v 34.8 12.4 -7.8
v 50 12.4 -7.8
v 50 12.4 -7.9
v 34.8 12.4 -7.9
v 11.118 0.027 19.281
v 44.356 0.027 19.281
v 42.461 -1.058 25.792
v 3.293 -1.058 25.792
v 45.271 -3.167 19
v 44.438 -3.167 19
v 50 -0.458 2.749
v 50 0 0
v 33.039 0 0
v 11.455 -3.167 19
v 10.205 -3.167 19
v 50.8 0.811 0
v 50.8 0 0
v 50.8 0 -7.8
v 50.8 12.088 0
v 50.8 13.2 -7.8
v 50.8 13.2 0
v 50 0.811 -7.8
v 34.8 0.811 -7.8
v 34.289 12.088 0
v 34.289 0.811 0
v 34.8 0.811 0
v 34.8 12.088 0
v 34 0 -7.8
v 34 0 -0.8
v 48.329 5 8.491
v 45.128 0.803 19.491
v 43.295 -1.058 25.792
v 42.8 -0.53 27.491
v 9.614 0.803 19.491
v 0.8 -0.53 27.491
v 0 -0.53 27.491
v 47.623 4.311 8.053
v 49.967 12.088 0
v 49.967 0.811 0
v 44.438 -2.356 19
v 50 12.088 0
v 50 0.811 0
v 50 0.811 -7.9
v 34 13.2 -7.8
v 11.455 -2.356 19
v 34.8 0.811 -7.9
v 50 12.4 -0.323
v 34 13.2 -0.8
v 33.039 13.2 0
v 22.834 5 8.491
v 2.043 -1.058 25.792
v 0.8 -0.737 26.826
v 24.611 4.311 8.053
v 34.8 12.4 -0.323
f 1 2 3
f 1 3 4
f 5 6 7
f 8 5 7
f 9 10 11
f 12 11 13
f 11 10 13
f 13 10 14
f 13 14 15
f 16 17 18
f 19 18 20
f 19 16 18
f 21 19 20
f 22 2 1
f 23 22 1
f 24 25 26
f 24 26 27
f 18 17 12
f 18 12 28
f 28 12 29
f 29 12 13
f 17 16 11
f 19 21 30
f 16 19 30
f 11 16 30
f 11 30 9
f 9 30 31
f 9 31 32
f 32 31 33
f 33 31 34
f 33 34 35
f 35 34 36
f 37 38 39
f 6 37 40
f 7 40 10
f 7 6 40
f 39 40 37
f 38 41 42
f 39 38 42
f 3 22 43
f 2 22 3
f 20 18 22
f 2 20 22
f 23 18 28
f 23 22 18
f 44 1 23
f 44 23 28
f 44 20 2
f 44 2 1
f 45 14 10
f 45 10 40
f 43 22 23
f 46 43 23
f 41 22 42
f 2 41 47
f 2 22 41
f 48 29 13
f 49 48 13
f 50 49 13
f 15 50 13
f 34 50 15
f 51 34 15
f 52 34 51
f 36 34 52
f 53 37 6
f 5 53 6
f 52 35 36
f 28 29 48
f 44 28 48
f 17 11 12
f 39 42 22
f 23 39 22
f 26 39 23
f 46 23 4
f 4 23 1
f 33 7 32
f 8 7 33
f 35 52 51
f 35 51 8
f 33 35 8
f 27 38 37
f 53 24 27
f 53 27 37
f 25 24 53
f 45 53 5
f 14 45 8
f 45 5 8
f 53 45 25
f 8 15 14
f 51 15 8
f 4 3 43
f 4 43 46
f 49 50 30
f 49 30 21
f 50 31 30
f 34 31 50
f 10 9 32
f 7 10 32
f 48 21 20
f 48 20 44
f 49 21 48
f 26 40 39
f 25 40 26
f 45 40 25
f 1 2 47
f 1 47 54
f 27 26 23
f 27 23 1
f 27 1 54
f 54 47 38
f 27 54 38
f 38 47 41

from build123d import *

# Parameters (mm, degrees)
SIDE_BASE_DEPTH                    = 0.8
SIDE_BASE_2_COUNT                  = 2
SIDE_BASE_2_PITCH                  = 50
FRONT_BACK_WALLS_REACH             = 60.566
BASE_SKETCH_W                      = 50.8
BASE_SKETCH_H                      = 13.2
BASE_SKETCH_W_2                    = 15.2
BASE_SKETCH_H_2                    = 11.276834123
BASE_DEPTH                         = 0.8
ATTACHMENT_BASE_SKETCH_W           = 16.8
ATTACHMENT_BASE_SKETCH_H           = 13.2
ATTACHMENT_BASE_SKETCH_W_2         = 15.2
ATTACHMENT_BASE_SKETCH_H_2         = 11.276834123
ATTACHMENT_BASE_DEPTH              = 7
PIPE_TOP_EXTRA_CUTAWAY_REACH       = 65.248
SKETCH11_W                         = 15.2
SKETCH11_H                         = 0.312130873
SKETCH1_W                          = 15.2
SKETCH1_H                          = 11.588964996
FAN_BASE_DEPTH                     = 0.1
LEFT_RIGHT_WALL_REMOVAL_DEPTH      = 59.566323483
LEFT_RIGHT_WALL_REMOVAL_DEPTH_BACK = 59.566323483
SKETCH6_W                          = 28.631700026
SKETCH6_H                          = 16.366666667
CUTAWAY_LEFT_DEPTH                 = 54.208577359
LEFT_WALL_DEPTH                    = 0.8331843
SKETCH9_W                          = 44.231215268
SKETCH9_H                          = 16.366666667
CUTAWAY_RIGHT_DEPTH                = 47.338131648
RIGHT_WALL_DEPTH                   = 1.25073473


with BuildPart() as part:
    # Side base sketch → Side base (new body)
    with BuildSketch(Plane.ZY):
        Polygon((0, 13.2), (8.491348573, 5), (19.491348573, 0.8030407), (27.491348573, -0.530292633), (19, -3.166666667), (6, -1), (0, 0), align=None)
    extrude(amount=-SIDE_BASE_DEPTH)


with BuildPart() as side_base_2_1:
    # Side base 2: pattern copy
    add(part.part.moved(Location(Vector(1, 0, 0) * (1 * SIDE_BASE_2_PITCH))))

    # Wall base sketch → Front back walls (add, up to next)
    with BuildSketch(Plane(origin=(0.8, 0, 0), x_dir=(0, 0, -1), z_dir=(1, 0, 0)), mode=Mode.PRIVATE) as front_back_walls_sk1:
        Polygon((0, 12.087869127), (-8.053310036, 4.310878025), (-19.280914859, 0.027077982), (-25.791579847, -1.058032849), (-27.491348573, -0.530292633), (-19.491348573, 0.8030407), (-8.491348573, 5), (0, 13.2), align=None)
    front_back_walls_tool1 = extrude(front_back_walls_sk1.sketch, amount=FRONT_BACK_WALLS_REACH, mode=Mode.PRIVATE) - side_base_2_1.part
    # Wall base sketch → Front back walls (add, up to next)
    with BuildSketch(Plane(origin=(0.8, 0, 0), x_dir=(0, 0, -1), z_dir=(1, 0, 0)), mode=Mode.PRIVATE) as front_back_walls_sk2:
        Polygon((0, 0.811035004), (-19, -2.355631663), (-19, -3.166666667), (0, 0), align=None)
    front_back_walls_tool2 = extrude(front_back_walls_sk2.sketch, amount=FRONT_BACK_WALLS_REACH, mode=Mode.PRIVATE) - side_base_2_1.part

    add(part.part)  # Front back walls merges part
    add(front_back_walls_tool1.solids().sort_by_distance((0.8, 8.422144, 4.241782))[0])
    add(front_back_walls_tool2.solids().sort_by_distance((0.8, -1.177816, 9.5))[0])

    # Base sketch → Base (add)
    with BuildSketch(Plane(origin=(0, 0, 0), x_dir=(-1, 0, 0), z_dir=(0, 0, -1))):
        with Locations((-25.4, 6.6)):
            Rectangle(BASE_SKETCH_W, BASE_SKETCH_H)
        with Locations((-42.4, 6.449452066)):
            Rectangle(BASE_SKETCH_W_2, BASE_SKETCH_H_2, mode=Mode.SUBTRACT)
    extrude(amount=BASE_DEPTH)

    # Attachment base sketch → Attachment base (add)
    with BuildSketch(Plane(origin=(0, 0, -0.8), x_dir=(-1, 0, 0), z_dir=(0, 0, -1))):
        with Locations((-42.4, 6.6)):
            Rectangle(ATTACHMENT_BASE_SKETCH_W, ATTACHMENT_BASE_SKETCH_H)
        with Locations((-42.4, 6.449452066)):
            Rectangle(ATTACHMENT_BASE_SKETCH_W_2, ATTACHMENT_BASE_SKETCH_H_2, mode=Mode.SUBTRACT)
    extrude(amount=ATTACHMENT_BASE_DEPTH)

    # Pipe top extra cutaway: up to this plane
    pipe_top_extra_cutaway_end = Plane(origin=(500000, 12.087869127, 0), z_dir=(0, 0.7193398003386524, 0.6946583704589959))
    # Sketch11 → Pipe top extra cutaway (cut, up to the surface)
    with BuildSketch(Plane(origin=(0, 0, -7.8), x_dir=(-1, 0, 0), z_dir=(0, 0, -1)), mode=Mode.PRIVATE) as pipe_top_extra_cutaway_sk1:
        with Locations((-42.4, 12.243934564)):
            Rectangle(SKETCH11_W, SKETCH11_H)
    pipe_top_extra_cutaway_tool1 = split(extrude(pipe_top_extra_cutaway_sk1.sketch, amount=-PIPE_TOP_EXTRA_CUTAWAY_REACH, mode=Mode.PRIVATE), bisect_by=pipe_top_extra_cutaway_end, keep=Keep.BOTH, mode=Mode.PRIVATE)
    add(pipe_top_extra_cutaway_tool1.solids().sort_by_distance((42.4, 12.243935, -7.8))[0], mode=Mode.SUBTRACT)

    # Sketch4 → Left right wall removal (cut, two sides: drawn at the far end of the back side and taken through both)
    with BuildSketch(Plane(origin=(0.8, 0, 0), x_dir=(0, 0, -1), z_dir=(1, 0, 0)).offset(-LEFT_RIGHT_WALL_REMOVAL_DEPTH_BACK)):
        Polygon((-25.791579847, -1.058032849), (-19, -3.166666667), (-19, -2.355631663), (0, 0.811035004), (0, 12.087869127), (-8.053310036, 4.310878025), (-19.280914859, 0.027077982), align=None)
    extrude(amount=LEFT_RIGHT_WALL_REMOVAL_DEPTH + LEFT_RIGHT_WALL_REMOVAL_DEPTH_BACK, mode=Mode.SUBTRACT)

    # Sketch6 → Cutaway left (cut, through all)
    with BuildSketch(Plane(origin=(46.834030083, 0, 13.628732678), x_dir=(0.27941058312270783, 0, -0.9601717169543313), z_dir=(0.9601717169543312, 0, 0.2794105831227078))):
        with Locations((-0.12179239, 5.016666667)):
            Rectangle(SKETCH6_W, SKETCH6_H)
    extrude(amount=CUTAWAY_LEFT_DEPTH, mode=Mode.SUBTRACT)

    # Sketch7 → Left wall (add, along a direction that is not the sketch's normal)
    with BuildSketch(Plane(origin=(46.834030083, 0, 13.628732678), x_dir=(0.27941058312270806, 0, -0.9601717169543312), z_dir=(0.9601717169543312, 0, 0.27941058312270806))):
        Polygon((-5.594069506, -2.355631663), (-5.594069506, -3.166666667), (-12.667366633, -1.058032849), (-5.886636818, 0.027077982), (5.806693265, 4.310878025), (14.194057623, 12.087869127), (14.194057623, 0.811035004), align=None)
    extrude(amount=-LEFT_WALL_DEPTH, dir=(1, 0, 0))

    # Sketch9 → Cutaway right (cut, through all)
    with BuildSketch(Plane(origin=(13.516705988, 0, 16.244117965), x_dir=(0.7686879004792403, 0, -0.6396240393049794), z_dir=(0.6396240393049794, -1.3449343476138912e-15, 0.7686879004792403))):
        with Locations((4.531480214, 5.016666667)):
            Rectangle(SKETCH9_W, SKETCH9_H)
    extrude(amount=-CUTAWAY_RIGHT_DEPTH, mode=Mode.SUBTRACT)

    # Sketch10 → Right wall (add, along a direction that is not the sketch's normal)
    with BuildSketch(Plane(origin=(13.516705988, 0, 16.244117965), x_dir=(-0.7686879004792402, -2.570451750162017e-15, 0.6396240393049794), z_dir=(-0.6396240393049794, 1.2488685157059335e-15, -0.7686879004792402))):
        Polygon((-25.396353118, 12.087869127), (-25.396353118, 0.811035004), (4.308596716, -2.355631663), (4.308596716, -3.166666667), (14.926677697, -1.058032849), (4.747784179, 0.027077982), (-12.805659927, 4.310878025), align=None)
    extrude(amount=-RIGHT_WALL_DEPTH, dir=(-1, 0, 0))


with BuildPart() as body_2:
    # Sketch1 → Fan base (new body)
    with BuildSketch(Plane(origin=(0, 0, -7.8), x_dir=(-1, 0, 0), z_dir=(0, 0, -1))):
        with Locations((-42.4, 6.605517502)):
            Rectangle(SKETCH1_W, SKETCH1_H)
    extrude(amount=FAN_BASE_DEPTH)


solid = Compound([side_base_2_1.part, body_2.part])
